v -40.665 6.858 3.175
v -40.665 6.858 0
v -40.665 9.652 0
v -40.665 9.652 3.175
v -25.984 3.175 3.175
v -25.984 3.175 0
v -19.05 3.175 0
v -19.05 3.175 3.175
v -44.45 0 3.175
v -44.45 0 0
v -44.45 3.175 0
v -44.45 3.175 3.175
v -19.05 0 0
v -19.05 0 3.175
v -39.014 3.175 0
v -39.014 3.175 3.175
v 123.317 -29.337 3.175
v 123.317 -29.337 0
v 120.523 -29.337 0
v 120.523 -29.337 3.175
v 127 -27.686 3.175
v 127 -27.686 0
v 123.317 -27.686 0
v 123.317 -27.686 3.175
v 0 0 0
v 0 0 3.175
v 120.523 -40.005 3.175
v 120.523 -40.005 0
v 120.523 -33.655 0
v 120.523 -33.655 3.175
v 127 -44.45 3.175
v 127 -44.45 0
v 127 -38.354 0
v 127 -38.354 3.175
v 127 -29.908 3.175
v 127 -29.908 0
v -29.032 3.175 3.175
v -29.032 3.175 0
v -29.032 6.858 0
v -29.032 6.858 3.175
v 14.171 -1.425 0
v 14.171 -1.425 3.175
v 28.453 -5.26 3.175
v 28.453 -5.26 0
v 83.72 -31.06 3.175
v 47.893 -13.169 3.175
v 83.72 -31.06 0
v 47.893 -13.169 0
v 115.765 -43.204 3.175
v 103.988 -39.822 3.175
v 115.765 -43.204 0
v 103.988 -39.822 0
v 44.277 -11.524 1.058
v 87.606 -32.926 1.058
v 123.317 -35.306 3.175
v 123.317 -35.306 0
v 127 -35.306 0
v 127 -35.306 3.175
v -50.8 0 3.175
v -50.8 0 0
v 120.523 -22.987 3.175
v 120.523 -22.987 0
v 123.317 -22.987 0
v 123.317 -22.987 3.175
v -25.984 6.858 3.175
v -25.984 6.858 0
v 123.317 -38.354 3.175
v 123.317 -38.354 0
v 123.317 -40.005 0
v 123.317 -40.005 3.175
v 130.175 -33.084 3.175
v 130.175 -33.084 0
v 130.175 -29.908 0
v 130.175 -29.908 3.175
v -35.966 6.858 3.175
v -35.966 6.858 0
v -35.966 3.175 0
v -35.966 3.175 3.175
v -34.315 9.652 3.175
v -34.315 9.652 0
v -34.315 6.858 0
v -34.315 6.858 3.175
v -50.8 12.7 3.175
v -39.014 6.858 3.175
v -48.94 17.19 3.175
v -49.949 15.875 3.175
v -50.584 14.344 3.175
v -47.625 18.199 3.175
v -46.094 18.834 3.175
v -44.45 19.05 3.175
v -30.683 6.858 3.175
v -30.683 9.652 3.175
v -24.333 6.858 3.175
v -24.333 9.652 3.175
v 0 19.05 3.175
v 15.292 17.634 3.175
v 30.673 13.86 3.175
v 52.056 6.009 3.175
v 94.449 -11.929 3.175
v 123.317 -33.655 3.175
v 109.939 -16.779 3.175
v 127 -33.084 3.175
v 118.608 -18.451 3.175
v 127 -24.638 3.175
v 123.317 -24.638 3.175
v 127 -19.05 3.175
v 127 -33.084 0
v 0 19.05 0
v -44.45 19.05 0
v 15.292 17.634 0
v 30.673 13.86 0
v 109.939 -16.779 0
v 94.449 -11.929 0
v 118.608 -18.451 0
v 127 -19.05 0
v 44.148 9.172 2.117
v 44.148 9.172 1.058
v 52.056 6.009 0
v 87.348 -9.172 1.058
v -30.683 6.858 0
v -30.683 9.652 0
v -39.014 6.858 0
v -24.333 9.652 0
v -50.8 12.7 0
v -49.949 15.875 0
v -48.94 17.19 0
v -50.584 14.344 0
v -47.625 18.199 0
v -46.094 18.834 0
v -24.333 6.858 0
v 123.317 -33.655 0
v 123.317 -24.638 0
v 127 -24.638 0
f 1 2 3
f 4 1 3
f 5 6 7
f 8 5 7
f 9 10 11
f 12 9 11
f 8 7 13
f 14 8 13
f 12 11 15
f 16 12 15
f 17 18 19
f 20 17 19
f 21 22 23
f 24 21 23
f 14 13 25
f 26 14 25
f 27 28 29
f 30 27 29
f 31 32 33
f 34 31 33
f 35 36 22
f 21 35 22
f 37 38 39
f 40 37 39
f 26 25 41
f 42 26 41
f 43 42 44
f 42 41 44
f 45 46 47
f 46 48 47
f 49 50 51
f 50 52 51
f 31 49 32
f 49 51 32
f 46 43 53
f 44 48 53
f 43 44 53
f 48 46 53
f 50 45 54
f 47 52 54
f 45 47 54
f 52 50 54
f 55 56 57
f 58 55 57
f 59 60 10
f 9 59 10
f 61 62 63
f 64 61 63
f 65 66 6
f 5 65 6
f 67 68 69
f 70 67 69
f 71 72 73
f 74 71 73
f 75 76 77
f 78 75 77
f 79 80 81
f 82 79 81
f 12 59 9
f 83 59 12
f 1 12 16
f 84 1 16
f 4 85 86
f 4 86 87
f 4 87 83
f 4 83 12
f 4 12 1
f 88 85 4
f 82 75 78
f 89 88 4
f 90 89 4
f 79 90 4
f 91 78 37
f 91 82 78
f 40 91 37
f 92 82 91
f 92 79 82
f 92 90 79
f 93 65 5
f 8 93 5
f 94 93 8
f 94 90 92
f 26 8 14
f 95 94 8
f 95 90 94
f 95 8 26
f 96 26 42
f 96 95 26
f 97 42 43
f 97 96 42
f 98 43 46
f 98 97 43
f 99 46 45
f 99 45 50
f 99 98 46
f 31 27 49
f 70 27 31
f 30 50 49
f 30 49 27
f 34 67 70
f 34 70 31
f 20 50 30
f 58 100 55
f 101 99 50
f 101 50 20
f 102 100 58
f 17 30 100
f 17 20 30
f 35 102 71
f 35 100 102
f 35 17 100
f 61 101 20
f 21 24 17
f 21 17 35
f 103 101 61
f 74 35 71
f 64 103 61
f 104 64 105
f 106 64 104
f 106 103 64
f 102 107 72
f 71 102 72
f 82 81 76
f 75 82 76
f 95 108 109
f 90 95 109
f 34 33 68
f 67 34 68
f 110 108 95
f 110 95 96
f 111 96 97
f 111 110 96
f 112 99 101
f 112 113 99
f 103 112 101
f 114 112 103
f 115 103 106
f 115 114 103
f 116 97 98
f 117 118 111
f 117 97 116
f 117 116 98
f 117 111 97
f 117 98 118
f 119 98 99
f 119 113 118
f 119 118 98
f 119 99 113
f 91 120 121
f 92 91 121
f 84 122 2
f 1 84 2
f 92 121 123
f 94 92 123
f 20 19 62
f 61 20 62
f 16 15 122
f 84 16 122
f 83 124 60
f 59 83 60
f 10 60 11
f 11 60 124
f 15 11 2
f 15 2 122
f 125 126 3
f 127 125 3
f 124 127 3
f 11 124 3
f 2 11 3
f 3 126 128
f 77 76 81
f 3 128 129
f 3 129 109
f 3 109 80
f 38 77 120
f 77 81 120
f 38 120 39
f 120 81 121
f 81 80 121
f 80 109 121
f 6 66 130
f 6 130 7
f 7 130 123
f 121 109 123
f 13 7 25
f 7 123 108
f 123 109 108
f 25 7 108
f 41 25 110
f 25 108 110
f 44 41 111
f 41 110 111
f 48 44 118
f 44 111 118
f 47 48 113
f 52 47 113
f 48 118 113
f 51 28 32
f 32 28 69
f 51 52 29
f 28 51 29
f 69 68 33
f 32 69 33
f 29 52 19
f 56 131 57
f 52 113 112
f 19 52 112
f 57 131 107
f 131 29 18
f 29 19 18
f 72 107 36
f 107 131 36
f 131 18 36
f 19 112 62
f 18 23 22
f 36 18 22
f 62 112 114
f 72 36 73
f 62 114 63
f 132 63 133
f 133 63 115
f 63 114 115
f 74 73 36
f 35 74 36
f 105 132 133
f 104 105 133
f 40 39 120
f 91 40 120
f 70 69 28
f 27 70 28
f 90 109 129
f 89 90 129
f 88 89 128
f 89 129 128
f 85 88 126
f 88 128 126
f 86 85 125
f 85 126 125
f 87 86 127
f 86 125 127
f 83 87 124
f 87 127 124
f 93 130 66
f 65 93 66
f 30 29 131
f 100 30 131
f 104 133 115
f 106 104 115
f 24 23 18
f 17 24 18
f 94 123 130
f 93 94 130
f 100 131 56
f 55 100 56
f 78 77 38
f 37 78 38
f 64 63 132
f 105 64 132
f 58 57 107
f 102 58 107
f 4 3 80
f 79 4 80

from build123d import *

# Parameters (mm, degrees)
BOSS_EXTRUDE1_DEPTH = 3.175


with BuildPart() as part:
    # Sketch1 → Boss-Extrude1 (new body)
    with BuildSketch(Plane.XY):
        with BuildLine():
            Line((-50.8, 12.7), (-50.8, 0))
            Line((-50.8, 0), (-44.45, 0))
            Line((-44.45, 0), (-44.45, 3.175))
            Line((-44.45, 3.175), (-39.0144, 3.175))
            Line((-39.0144, 3.175), (-39.0144, 6.858))
            Line((-39.0144, 6.858), (-40.6654, 6.858))
            Line((-40.6654, 6.858), (-40.6654, 9.652))
            Line((-40.6654, 9.652), (-34.3154, 9.652))
            Line((-34.3154, 9.652), (-34.3154, 6.858))
            Line((-34.3154, 6.858), (-35.9664, 6.858))
            Line((-35.9664, 6.858), (-35.9664, 3.175))
            Line((-35.9664, 3.175), (-29.0322, 3.175))
            Line((-29.0322, 3.175), (-29.0322, 6.858))
            Line((-29.0322, 6.858), (-30.6832, 6.858))
            Line((-30.6832, 6.858), (-30.6832, 9.652))
            Line((-30.6832, 9.652), (-24.3332, 9.652))
            Line((-24.3332, 9.652), (-24.3332, 6.858))
            Line((-24.3332, 6.858), (-25.9842, 6.858))
            Line((-25.9842, 6.858), (-25.9842, 3.175))
            Line((-25.9842, 3.175), (-19.05, 3.175))
            Line((-19.05, 3.175), (-19.05, 0))
            Line((-19.05, 0), (0, 0))
            add(Edge.make_bspline(
                [(0, 0), (43.75699028, 0), (90.568040393, -44.45), (127, -44.45)],
                knots=[0, 0, 0, 0, 1, 1, 1, 1], degree=3))
            Line((127, -44.45), (127, -38.354))
            Line((127, -38.354), (123.317, -38.354))
            Line((123.317, -38.354), (123.317, -40.005))
            Line((123.317, -40.005), (120.523, -40.005))
            Line((120.523, -40.005), (120.523, -33.655))
            Line((120.523, -33.655), (123.317, -33.655))
            Line((123.317, -33.655), (123.317, -35.306))
            Line((123.317, -35.306), (127, -35.306))
            Line((127, -35.306), (127, -33.0835))
            Line((127, -33.0835), (130.175, -33.0835))
            Line((130.175, -33.0835), (130.175, -29.9085))
            Line((130.175, -29.9085), (127, -29.9085))
            Line((127, -29.9085), (127, -27.686))
            Line((127, -27.686), (123.317, -27.686))
            Line((123.317, -27.686), (123.317, -29.337))
            Line((123.317, -29.337), (120.523, -29.337))
            Line((120.523, -29.337), (120.523, -22.987))
            Line((120.523, -22.987), (123.317, -22.987))
            Line((123.317, -22.987), (123.317, -24.638))
            Line((123.317, -24.638), (127, -24.638))
            Line((127, -24.638), (127, -19.05))
            add(Edge.make_bspline(
                [(0, 19.05), (43.75699028, 19.05), (89.987535232, -19.05), (127, -19.05)],
                knots=[0, 0, 0, 0, 1, 1, 1, 1], degree=3))
            Line((0, 19.05), (-44.45, 19.05))
            ThreePointArc((-44.45, 19.05), (-48.940128061, 17.190128061), (-50.8, 12.7))
        make_face()
    extrude(amount=BOSS_EXTRUDE1_DEPTH)


solid = part.part
